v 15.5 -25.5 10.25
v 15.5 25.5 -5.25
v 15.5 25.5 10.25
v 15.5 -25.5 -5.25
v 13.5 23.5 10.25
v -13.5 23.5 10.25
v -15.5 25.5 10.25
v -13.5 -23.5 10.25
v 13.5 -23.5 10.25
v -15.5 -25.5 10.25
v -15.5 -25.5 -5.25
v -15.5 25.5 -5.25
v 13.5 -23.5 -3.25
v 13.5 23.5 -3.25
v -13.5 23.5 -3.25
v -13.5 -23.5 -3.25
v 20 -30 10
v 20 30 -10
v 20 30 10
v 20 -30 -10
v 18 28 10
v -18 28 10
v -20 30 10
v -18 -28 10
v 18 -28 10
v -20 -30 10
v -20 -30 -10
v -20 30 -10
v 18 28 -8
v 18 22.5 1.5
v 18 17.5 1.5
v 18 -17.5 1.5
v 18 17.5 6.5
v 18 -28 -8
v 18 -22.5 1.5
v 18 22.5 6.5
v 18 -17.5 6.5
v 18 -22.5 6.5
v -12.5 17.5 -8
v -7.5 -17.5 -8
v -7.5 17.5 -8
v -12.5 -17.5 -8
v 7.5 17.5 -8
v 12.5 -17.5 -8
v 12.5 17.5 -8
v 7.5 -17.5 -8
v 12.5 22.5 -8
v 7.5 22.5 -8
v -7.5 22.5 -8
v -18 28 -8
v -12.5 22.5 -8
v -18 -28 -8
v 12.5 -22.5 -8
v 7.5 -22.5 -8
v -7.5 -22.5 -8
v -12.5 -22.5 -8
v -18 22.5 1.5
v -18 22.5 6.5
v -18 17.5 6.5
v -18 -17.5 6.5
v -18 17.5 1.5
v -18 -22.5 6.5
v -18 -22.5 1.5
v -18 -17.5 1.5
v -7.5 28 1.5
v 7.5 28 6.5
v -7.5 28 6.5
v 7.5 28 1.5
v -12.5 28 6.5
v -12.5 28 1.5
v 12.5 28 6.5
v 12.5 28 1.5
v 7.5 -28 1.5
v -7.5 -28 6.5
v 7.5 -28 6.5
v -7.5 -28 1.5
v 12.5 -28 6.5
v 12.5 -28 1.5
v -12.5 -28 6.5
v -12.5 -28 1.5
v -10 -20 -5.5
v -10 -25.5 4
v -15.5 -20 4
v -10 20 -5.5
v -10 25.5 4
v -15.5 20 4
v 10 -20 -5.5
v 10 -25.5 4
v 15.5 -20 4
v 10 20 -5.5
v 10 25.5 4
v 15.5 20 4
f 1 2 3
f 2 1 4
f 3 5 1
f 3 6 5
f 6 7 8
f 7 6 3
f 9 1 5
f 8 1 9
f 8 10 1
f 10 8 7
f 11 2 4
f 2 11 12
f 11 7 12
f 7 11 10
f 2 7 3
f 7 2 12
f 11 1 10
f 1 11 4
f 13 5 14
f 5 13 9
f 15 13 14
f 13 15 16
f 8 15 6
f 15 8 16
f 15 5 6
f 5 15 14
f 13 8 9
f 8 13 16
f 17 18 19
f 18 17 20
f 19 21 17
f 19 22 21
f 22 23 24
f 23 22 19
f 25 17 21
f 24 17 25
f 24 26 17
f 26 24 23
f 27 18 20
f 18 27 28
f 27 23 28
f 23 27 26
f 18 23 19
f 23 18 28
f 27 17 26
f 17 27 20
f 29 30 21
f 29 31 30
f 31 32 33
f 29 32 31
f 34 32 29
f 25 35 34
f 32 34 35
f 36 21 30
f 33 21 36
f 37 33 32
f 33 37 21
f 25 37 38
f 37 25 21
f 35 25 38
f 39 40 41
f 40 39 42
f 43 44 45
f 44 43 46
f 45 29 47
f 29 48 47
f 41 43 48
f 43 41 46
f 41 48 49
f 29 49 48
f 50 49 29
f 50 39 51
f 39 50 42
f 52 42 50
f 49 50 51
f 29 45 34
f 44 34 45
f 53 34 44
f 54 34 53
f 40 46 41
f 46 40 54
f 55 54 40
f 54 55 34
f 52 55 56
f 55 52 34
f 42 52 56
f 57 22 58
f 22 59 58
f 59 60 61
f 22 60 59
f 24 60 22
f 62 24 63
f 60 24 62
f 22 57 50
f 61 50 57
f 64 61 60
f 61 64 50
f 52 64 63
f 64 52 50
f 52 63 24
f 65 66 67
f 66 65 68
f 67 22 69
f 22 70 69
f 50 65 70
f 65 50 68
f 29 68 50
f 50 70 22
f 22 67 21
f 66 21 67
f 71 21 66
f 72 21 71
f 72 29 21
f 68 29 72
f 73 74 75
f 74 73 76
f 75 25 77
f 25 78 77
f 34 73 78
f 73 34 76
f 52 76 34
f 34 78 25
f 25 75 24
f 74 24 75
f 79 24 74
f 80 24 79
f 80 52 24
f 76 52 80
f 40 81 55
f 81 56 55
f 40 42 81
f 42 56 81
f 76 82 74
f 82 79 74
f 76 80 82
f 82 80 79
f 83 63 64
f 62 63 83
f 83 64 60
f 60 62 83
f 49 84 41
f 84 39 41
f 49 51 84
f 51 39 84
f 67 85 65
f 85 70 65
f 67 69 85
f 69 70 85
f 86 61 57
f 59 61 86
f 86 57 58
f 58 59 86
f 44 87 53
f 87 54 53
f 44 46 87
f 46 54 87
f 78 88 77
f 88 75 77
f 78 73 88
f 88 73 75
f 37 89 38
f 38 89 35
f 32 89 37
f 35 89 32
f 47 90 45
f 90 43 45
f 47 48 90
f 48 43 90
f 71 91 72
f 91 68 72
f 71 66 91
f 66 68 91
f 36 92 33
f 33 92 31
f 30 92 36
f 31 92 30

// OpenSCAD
inner();
outer();

module inner()
{
	translate([0,0,2.5])
	difference()
	{
		cube([36-2*2.5,56-2*2.5,18-2.5], center=true);
		translate([0, 0, 2])
			cube([32-2*2.5,52-2*2.5,18-2.5], center=true);
	}

}

module outer()
{
	union()
	{
		difference()
		{
			cube([40,60,20], center=true);
			translate([0, 0, 2])
				cube([36,56,20], center=true);
		}
	
		for(x=[-1,1])
		for(y=[-1,1])
		{
			translate([x*10,y*20,-8])
				pyramid_45(5, 2.5);
			translate([x*10,y*28,4])
				rotate([y*90, 0, 0])
					pyramid_45(5, 2.5);
			translate([x*18,y*20,4])
				rotate([0, -x*90, 0])
					pyramid_45(5, 2.5);
		}
	}
}


module pyramid_45(side=2.5, height=2.5)
{
polyhedron(
  points=[ [side/2,side/2,0],[side/2,-side/2,0],[-side/2,-side/2,0],
		[-side/2,side/2,0], [0,0,height]  ],
  triangles=[ [0,1,4],[1,2,4],[2,3,4],[3,0,4], 
              [1,0,3],[2,1,3] ] 
 );
}
